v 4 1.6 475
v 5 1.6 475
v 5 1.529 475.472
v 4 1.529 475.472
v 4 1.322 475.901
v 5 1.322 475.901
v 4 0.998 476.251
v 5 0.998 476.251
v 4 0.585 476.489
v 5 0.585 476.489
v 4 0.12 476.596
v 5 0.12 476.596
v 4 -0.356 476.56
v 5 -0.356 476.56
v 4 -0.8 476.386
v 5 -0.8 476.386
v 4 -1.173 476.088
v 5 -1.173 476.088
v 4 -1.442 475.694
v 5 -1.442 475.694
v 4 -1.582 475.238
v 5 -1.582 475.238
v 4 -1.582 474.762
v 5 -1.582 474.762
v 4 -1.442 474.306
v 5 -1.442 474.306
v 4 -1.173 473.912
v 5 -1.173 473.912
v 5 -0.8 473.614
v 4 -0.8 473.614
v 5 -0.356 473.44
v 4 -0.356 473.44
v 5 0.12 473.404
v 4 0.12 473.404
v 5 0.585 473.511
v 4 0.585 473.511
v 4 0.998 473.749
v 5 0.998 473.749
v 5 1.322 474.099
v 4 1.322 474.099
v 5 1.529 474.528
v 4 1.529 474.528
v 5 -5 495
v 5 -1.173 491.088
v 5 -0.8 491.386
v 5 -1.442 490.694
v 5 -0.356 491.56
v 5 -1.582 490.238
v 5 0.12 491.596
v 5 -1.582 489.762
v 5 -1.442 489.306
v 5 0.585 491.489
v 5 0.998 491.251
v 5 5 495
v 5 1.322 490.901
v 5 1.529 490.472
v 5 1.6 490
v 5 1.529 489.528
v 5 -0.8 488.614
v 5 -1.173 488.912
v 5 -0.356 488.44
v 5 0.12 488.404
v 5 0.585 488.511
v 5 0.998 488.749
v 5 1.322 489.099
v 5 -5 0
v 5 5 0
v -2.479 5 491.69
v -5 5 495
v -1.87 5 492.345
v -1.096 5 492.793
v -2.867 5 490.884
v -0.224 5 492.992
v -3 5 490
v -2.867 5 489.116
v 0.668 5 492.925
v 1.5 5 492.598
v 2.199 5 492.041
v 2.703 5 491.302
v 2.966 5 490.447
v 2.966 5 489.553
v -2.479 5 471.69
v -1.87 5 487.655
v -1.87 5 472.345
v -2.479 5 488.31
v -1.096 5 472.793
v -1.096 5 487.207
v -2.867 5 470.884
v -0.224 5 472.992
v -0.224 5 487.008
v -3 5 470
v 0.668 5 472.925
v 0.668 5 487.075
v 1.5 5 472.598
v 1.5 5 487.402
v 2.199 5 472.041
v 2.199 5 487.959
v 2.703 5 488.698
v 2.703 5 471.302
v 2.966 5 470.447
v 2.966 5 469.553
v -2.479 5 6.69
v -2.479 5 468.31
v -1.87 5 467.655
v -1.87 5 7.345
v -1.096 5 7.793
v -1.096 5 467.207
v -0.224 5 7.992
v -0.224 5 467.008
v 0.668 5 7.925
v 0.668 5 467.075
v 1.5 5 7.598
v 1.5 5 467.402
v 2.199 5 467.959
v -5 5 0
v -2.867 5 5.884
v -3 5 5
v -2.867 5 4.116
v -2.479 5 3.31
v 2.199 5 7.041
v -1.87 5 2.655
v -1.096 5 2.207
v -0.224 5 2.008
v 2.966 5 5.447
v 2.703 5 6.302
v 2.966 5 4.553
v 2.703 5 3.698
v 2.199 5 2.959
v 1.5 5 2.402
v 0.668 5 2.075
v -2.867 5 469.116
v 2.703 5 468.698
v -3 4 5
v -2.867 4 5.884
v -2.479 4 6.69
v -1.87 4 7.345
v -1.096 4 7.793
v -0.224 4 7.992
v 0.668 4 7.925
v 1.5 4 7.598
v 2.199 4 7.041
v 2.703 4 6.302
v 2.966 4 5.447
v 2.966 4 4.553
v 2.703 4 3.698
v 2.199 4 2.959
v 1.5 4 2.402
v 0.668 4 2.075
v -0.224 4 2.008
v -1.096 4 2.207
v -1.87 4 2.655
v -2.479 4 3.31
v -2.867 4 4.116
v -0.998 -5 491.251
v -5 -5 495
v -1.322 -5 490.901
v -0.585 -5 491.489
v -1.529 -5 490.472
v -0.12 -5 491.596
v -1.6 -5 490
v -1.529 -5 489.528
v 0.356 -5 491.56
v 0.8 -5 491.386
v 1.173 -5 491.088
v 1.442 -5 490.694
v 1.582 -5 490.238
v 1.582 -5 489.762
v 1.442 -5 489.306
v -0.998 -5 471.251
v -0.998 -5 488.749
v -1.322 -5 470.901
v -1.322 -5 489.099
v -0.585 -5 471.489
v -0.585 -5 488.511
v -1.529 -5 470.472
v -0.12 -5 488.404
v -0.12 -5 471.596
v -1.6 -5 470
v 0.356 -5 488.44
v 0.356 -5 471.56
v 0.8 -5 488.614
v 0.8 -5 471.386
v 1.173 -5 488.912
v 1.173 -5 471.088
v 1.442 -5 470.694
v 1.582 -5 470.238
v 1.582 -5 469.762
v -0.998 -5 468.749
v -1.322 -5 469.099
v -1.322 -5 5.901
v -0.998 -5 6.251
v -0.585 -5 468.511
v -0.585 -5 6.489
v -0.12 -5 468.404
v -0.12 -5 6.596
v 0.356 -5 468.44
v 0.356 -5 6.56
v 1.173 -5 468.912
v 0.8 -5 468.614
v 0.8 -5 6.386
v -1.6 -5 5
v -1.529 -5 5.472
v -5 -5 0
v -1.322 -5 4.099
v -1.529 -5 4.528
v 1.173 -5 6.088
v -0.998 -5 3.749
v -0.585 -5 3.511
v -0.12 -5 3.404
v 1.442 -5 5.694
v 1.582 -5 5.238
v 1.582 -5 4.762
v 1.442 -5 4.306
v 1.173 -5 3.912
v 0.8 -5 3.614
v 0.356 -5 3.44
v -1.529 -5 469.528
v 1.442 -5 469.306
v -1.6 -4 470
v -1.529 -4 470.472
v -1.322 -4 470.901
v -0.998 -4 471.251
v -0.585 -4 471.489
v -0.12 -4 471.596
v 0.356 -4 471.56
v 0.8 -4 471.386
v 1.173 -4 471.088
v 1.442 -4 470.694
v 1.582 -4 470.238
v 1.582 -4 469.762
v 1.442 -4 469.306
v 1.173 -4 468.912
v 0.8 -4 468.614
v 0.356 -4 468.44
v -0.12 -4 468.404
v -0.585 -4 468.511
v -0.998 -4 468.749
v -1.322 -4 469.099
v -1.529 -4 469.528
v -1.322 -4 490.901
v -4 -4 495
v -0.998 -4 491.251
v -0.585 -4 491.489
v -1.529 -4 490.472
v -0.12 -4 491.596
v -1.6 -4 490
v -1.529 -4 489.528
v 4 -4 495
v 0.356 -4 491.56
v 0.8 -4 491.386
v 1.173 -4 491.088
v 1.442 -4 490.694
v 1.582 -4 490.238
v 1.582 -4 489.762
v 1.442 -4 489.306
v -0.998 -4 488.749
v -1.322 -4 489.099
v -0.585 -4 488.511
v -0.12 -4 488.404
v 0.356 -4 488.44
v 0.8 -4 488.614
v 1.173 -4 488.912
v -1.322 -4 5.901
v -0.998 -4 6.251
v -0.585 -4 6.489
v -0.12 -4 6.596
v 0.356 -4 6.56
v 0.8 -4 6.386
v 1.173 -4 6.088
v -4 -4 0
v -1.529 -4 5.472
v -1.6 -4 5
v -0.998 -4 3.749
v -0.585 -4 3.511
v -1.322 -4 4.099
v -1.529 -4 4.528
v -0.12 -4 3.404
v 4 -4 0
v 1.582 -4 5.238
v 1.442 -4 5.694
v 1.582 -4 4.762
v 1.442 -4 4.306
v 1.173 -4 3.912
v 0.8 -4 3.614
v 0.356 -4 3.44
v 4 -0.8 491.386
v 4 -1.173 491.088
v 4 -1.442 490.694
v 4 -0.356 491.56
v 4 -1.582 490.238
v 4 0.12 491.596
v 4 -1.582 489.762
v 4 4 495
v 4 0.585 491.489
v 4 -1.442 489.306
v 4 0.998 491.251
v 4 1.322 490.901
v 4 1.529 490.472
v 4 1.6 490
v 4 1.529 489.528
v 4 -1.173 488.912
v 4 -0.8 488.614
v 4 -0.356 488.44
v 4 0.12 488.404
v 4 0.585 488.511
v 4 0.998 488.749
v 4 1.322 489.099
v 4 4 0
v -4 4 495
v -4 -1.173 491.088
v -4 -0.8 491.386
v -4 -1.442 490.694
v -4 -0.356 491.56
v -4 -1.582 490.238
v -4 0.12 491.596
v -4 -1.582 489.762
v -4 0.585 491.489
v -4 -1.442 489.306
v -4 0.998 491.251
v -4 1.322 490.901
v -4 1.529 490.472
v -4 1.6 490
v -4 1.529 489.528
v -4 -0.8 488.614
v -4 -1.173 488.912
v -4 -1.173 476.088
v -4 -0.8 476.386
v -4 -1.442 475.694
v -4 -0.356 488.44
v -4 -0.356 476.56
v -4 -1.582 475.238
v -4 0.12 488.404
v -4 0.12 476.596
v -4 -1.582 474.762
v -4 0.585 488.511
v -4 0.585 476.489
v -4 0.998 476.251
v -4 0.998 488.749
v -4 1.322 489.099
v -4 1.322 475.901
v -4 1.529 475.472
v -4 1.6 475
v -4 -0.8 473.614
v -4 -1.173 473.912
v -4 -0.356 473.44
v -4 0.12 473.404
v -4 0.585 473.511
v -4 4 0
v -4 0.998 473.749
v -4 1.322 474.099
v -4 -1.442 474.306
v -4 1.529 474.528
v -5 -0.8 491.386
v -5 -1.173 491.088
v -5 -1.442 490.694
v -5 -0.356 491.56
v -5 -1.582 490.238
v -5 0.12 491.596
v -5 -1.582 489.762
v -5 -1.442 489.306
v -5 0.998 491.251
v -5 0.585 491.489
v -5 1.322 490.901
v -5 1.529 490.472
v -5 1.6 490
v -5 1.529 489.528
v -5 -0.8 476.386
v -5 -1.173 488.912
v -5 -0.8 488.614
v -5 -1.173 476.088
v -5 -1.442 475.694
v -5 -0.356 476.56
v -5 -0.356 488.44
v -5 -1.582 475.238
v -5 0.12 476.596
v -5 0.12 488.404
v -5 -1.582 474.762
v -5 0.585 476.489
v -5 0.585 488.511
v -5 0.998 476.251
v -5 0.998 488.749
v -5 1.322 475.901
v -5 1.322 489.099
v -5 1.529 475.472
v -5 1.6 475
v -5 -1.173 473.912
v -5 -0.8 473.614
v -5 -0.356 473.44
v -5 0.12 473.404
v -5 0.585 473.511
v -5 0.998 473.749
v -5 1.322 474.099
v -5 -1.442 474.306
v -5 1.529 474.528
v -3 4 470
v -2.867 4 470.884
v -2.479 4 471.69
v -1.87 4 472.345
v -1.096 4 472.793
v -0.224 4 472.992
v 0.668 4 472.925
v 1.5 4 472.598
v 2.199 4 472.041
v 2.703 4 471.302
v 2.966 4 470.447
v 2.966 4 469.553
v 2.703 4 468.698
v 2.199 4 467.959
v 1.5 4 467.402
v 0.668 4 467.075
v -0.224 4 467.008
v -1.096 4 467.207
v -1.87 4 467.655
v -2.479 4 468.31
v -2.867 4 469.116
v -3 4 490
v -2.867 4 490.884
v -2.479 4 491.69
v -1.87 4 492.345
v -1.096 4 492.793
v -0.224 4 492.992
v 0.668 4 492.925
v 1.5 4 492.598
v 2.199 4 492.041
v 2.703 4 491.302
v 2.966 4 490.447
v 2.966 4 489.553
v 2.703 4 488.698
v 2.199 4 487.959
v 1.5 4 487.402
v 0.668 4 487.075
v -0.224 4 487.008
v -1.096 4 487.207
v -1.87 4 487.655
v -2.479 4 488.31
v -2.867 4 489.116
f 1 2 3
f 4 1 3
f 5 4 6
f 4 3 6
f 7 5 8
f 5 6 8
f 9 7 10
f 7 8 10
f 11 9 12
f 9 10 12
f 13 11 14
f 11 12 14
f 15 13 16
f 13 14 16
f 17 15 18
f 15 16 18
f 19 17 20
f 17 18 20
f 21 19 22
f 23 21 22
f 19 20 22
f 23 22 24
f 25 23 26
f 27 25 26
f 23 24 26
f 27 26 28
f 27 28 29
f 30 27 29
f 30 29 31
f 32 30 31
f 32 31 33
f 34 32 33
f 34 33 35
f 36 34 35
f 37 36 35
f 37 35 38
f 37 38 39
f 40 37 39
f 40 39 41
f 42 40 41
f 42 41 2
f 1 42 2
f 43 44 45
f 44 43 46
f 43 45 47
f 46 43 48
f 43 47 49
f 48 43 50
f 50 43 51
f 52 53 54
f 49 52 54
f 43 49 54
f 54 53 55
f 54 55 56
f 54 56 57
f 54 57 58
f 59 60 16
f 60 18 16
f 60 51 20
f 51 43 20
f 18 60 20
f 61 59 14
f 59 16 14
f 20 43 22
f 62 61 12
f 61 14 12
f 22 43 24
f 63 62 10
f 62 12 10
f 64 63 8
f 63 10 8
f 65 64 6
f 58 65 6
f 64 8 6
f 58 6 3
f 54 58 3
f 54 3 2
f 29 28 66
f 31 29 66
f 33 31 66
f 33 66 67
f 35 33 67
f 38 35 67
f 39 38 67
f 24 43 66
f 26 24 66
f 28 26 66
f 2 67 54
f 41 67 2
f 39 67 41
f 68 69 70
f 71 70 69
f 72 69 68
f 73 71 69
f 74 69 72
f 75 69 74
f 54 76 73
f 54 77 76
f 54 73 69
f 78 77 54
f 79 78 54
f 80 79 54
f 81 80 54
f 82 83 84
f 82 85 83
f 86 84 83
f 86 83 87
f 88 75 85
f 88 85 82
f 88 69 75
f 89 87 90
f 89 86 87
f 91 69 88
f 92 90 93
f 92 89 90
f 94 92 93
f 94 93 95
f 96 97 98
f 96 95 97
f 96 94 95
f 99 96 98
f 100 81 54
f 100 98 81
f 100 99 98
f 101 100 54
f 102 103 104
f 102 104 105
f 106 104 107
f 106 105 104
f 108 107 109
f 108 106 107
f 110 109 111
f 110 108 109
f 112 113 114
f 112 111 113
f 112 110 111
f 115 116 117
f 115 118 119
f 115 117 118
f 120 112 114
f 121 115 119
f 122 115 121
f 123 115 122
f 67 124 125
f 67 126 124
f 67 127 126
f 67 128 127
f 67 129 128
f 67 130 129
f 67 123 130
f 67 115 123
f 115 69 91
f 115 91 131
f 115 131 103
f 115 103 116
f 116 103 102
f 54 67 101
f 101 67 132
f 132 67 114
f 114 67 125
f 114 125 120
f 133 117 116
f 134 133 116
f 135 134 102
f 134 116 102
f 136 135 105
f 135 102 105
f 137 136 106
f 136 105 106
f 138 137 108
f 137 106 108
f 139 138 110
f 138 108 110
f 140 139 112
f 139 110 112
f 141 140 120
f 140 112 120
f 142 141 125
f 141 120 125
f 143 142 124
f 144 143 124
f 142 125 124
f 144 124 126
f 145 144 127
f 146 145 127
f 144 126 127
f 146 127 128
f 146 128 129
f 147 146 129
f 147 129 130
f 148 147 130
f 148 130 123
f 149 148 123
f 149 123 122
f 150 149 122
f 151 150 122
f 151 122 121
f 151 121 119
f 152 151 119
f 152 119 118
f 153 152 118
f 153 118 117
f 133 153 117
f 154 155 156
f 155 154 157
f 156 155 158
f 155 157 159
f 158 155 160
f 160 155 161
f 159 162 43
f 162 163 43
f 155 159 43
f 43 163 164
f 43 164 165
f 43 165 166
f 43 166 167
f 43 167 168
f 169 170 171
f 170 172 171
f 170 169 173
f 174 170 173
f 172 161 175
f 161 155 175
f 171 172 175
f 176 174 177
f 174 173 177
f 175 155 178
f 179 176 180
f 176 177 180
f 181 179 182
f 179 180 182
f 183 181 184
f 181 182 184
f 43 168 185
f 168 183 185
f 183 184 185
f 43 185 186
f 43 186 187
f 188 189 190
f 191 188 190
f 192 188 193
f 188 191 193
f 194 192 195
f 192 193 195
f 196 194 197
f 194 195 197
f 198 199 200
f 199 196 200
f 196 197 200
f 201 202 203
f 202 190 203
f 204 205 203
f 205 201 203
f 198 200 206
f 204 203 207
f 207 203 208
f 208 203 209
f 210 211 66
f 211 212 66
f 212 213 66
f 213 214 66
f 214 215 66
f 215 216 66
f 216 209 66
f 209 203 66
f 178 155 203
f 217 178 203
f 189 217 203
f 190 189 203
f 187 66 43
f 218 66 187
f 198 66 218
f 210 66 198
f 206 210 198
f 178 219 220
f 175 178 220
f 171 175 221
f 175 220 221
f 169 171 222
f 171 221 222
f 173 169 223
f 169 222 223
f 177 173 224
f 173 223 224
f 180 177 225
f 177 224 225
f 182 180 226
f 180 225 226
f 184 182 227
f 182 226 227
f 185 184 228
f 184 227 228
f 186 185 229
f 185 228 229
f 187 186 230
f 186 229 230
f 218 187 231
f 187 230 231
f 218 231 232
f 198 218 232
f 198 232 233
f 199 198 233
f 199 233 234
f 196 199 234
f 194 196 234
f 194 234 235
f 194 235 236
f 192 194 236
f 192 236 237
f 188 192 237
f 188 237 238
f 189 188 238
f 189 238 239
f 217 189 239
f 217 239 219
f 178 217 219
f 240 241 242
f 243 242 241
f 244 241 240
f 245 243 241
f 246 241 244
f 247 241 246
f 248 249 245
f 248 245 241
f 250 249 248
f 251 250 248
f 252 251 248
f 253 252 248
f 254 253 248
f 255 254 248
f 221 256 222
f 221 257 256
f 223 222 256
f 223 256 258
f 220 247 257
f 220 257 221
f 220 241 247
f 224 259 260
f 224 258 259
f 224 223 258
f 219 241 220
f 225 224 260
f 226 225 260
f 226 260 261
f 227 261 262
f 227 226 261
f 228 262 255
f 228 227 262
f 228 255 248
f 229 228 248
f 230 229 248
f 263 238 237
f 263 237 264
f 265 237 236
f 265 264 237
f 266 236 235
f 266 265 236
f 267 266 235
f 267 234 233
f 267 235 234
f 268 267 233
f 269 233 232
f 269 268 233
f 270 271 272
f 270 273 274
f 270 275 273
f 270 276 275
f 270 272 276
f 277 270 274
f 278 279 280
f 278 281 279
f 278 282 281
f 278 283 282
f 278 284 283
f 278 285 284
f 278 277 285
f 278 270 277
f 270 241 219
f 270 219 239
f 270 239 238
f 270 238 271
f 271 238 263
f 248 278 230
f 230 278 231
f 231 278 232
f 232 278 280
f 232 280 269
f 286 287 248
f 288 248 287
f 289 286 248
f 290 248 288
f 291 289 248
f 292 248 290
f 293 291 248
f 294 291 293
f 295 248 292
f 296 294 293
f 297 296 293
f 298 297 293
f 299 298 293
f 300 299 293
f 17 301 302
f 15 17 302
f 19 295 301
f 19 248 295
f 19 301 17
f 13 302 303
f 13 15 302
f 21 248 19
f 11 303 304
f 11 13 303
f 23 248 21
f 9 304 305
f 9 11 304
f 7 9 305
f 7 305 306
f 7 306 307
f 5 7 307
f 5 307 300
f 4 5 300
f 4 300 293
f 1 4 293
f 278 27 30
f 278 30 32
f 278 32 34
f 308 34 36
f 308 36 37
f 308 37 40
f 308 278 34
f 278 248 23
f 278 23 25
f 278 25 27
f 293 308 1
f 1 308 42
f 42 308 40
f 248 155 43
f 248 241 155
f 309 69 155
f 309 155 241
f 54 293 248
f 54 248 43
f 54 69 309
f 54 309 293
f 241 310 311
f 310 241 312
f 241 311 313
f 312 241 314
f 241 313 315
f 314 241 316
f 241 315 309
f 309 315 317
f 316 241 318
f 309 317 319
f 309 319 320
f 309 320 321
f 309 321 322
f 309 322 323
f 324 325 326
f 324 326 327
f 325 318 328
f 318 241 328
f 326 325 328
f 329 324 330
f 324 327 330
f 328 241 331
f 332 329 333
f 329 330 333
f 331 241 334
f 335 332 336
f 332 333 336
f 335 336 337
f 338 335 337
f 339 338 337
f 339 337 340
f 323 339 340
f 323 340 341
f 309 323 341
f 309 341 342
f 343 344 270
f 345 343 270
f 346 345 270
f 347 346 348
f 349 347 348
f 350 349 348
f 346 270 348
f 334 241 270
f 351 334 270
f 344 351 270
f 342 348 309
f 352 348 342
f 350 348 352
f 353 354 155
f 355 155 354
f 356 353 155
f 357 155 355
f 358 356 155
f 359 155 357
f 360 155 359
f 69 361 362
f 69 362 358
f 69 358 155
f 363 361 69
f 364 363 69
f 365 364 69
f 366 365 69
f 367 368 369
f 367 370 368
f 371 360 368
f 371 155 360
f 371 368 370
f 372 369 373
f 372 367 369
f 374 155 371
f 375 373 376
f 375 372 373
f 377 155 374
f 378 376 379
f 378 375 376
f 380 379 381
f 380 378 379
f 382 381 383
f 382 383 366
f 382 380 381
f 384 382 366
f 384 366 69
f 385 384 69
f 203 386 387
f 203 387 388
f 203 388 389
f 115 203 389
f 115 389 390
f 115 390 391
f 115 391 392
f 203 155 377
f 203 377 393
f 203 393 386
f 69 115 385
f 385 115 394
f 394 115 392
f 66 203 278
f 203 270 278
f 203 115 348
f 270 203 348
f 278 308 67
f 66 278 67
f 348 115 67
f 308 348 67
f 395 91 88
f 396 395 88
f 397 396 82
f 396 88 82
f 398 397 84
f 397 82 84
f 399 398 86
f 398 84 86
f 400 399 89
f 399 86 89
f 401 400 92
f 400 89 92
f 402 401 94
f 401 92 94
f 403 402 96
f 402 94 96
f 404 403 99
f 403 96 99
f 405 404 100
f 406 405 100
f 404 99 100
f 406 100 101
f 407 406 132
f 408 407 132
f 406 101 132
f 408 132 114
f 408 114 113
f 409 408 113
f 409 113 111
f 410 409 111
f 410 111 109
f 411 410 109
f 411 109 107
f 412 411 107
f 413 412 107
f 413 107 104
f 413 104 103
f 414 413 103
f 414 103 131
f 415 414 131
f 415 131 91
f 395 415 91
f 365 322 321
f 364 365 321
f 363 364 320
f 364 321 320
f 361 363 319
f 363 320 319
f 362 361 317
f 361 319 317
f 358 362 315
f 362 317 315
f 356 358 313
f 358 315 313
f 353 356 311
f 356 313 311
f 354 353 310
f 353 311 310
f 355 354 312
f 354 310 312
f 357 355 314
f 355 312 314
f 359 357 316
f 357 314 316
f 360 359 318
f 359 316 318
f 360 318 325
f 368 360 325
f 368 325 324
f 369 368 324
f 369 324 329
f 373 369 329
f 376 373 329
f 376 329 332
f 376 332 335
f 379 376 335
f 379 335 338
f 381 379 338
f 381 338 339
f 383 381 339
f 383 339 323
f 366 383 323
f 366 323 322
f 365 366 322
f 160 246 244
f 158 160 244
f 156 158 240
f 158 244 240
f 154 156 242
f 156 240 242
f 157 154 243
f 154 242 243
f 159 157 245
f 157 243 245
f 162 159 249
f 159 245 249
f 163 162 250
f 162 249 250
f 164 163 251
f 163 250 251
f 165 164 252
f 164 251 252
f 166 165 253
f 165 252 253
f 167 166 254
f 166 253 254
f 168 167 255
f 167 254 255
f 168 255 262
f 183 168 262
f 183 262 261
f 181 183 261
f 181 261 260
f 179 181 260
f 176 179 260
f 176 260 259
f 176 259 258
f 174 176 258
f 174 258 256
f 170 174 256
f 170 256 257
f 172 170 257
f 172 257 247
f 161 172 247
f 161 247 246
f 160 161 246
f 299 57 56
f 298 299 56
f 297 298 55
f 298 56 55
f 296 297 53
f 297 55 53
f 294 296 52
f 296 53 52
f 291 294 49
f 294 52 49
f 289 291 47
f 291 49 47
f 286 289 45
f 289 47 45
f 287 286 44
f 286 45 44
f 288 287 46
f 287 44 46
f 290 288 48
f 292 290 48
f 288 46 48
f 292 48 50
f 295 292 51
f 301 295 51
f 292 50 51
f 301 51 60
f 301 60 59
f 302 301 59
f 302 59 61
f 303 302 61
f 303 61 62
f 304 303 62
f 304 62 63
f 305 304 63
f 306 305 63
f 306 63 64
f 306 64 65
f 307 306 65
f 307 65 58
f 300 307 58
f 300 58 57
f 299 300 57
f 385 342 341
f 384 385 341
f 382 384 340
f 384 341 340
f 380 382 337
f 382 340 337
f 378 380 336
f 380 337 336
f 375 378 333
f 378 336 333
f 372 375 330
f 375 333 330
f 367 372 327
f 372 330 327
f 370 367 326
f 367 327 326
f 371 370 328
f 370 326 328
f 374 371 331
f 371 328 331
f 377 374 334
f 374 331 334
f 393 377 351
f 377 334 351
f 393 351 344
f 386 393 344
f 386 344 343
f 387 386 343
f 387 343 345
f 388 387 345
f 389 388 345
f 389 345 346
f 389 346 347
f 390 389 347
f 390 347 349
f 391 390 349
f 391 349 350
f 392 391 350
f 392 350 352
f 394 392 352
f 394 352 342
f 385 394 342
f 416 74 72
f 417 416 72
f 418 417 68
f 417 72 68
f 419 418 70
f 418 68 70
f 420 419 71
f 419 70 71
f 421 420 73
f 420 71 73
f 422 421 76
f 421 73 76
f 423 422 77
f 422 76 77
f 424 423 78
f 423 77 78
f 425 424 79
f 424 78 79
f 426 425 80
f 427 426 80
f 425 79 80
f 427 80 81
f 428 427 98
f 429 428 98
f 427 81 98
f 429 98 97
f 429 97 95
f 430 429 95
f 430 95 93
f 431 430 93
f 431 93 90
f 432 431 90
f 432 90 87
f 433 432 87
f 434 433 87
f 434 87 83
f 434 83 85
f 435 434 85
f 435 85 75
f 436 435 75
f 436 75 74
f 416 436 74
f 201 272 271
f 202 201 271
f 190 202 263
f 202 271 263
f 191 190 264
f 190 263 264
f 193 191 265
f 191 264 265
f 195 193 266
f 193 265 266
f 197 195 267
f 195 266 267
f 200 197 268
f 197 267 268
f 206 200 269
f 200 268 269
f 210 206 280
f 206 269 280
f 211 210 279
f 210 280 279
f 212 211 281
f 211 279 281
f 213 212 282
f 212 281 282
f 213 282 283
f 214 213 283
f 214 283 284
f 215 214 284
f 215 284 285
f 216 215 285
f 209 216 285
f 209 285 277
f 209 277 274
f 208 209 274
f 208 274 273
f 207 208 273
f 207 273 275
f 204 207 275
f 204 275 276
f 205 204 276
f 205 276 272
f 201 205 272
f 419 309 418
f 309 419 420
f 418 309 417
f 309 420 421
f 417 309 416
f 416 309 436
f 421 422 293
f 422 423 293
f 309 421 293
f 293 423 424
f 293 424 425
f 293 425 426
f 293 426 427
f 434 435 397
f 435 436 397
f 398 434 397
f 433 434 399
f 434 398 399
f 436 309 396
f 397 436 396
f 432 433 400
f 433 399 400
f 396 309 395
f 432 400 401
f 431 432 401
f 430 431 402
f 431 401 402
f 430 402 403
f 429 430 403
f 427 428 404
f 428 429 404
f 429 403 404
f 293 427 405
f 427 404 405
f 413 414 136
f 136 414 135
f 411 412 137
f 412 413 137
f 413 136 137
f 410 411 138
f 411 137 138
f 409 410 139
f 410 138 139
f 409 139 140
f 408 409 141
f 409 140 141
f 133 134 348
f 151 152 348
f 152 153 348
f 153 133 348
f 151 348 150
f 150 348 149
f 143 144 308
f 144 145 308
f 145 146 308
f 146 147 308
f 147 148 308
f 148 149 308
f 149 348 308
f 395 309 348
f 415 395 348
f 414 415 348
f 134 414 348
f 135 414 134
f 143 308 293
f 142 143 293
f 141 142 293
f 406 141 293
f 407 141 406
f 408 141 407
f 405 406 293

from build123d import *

# Parameters (mm, degrees)
SKETCH_1_W          = 10
SKETCH_1_H          = 10
SKETCH_1_W_2        = 8
SKETCH_1_H_2        = 8
EXTRUDE_1_DEPTH     = 495
SKETCH_2_R          = 1.6
CUT_EXTRUDE_1_DEPTH = 496.126246527
CUT_EXTRUDE_2_REACH = 497.126
SKETCH_3_R          = 3
SKETCH_8_R          = 1.6
CUT_EXTRUDE_7_DEPTH = 496.126246527


with BuildPart() as part:
    # ｽｹｯﾁ1 → 押し出し-薄板1 (new body)
    with BuildSketch(Plane.XY):
        Rectangle(SKETCH_1_W, SKETCH_1_H)
        Rectangle(SKETCH_1_W_2, SKETCH_1_H_2, mode=Mode.SUBTRACT)
    extrude(amount=EXTRUDE_1_DEPTH)

    # ｽｹｯﾁ2 → ｶｯﾄ - 押し出し1 (cut, through all)
    with BuildSketch(Plane(origin=(0, 5, 0), x_dir=(1, 0, 0), z_dir=(0, 1, 0))):
        with Locations(Location((0, -5, 0), (0, 0, 180))):
            Circle(SKETCH_2_R)
        with Locations(Location((0, -490, 0), (0, 0, 180))):
            Circle(SKETCH_2_R)
        with Locations(Location((0, -470, 0), (0, 0, 180))):
            Circle(SKETCH_2_R)
    extrude(amount=-CUT_EXTRUDE_1_DEPTH, mode=Mode.SUBTRACT)

    # ｽｹｯﾁ3 → ｶｯﾄ - 押し出し2 (cut, up to next)
    with BuildSketch(Plane(origin=(0, 5, 0), x_dir=(1, 0, 0), z_dir=(0, 1, 0)), mode=Mode.PRIVATE) as cut_extrude_2_sk1:
        with Locations(Location((0, -5, 0), (0, 0, 180))):
            Circle(SKETCH_3_R)
    cut_extrude_2_tool1 = extrude(cut_extrude_2_sk1.sketch, amount=-CUT_EXTRUDE_2_REACH, mode=Mode.PRIVATE) & part.part
    # ｽｹｯﾁ3 → ｶｯﾄ - 押し出し2 (cut, up to next)
    with BuildSketch(Plane(origin=(0, 5, 0), x_dir=(1, 0, 0), z_dir=(0, 1, 0)), mode=Mode.PRIVATE) as cut_extrude_2_sk2:
        with Locations(Location((0, -490, 0), (0, 0, 180))):
            Circle(SKETCH_3_R)
    cut_extrude_2_tool2 = extrude(cut_extrude_2_sk2.sketch, amount=-CUT_EXTRUDE_2_REACH, mode=Mode.PRIVATE) & part.part
    # ｽｹｯﾁ3 → ｶｯﾄ - 押し出し2 (cut, up to next)
    with BuildSketch(Plane(origin=(0, 5, 0), x_dir=(1, 0, 0), z_dir=(0, 1, 0)), mode=Mode.PRIVATE) as cut_extrude_2_sk3:
        with Locations(Location((0, -470, 0), (0, 0, 180))):
            Circle(SKETCH_3_R)
    cut_extrude_2_tool3 = extrude(cut_extrude_2_sk3.sketch, amount=-CUT_EXTRUDE_2_REACH, mode=Mode.PRIVATE) & part.part
    add(cut_extrude_2_tool1.solids().sort_by_distance((0, 5, 5))[0], mode=Mode.SUBTRACT)
    add(cut_extrude_2_tool2.solids().sort_by_distance((0, 5, 490))[0], mode=Mode.SUBTRACT)
    add(cut_extrude_2_tool3.solids().sort_by_distance((0, 5, 470))[0], mode=Mode.SUBTRACT)

    # ｽｹｯﾁ8 → ｶｯﾄ - 押し出し7 (cut, through all)
    with BuildSketch(Plane(origin=(5, 0, 0), x_dir=(0, 0, -1), z_dir=(1, 0, 0))):
        with Locations(Location((-490, 0, 0), (0, 0, 90))):
            Circle(SKETCH_8_R)
        with Locations(Location((-475, 0, 0), (0, 0, 90))):
            Circle(SKETCH_8_R)
    extrude(amount=-CUT_EXTRUDE_7_DEPTH, mode=Mode.SUBTRACT)


solid = part.part
